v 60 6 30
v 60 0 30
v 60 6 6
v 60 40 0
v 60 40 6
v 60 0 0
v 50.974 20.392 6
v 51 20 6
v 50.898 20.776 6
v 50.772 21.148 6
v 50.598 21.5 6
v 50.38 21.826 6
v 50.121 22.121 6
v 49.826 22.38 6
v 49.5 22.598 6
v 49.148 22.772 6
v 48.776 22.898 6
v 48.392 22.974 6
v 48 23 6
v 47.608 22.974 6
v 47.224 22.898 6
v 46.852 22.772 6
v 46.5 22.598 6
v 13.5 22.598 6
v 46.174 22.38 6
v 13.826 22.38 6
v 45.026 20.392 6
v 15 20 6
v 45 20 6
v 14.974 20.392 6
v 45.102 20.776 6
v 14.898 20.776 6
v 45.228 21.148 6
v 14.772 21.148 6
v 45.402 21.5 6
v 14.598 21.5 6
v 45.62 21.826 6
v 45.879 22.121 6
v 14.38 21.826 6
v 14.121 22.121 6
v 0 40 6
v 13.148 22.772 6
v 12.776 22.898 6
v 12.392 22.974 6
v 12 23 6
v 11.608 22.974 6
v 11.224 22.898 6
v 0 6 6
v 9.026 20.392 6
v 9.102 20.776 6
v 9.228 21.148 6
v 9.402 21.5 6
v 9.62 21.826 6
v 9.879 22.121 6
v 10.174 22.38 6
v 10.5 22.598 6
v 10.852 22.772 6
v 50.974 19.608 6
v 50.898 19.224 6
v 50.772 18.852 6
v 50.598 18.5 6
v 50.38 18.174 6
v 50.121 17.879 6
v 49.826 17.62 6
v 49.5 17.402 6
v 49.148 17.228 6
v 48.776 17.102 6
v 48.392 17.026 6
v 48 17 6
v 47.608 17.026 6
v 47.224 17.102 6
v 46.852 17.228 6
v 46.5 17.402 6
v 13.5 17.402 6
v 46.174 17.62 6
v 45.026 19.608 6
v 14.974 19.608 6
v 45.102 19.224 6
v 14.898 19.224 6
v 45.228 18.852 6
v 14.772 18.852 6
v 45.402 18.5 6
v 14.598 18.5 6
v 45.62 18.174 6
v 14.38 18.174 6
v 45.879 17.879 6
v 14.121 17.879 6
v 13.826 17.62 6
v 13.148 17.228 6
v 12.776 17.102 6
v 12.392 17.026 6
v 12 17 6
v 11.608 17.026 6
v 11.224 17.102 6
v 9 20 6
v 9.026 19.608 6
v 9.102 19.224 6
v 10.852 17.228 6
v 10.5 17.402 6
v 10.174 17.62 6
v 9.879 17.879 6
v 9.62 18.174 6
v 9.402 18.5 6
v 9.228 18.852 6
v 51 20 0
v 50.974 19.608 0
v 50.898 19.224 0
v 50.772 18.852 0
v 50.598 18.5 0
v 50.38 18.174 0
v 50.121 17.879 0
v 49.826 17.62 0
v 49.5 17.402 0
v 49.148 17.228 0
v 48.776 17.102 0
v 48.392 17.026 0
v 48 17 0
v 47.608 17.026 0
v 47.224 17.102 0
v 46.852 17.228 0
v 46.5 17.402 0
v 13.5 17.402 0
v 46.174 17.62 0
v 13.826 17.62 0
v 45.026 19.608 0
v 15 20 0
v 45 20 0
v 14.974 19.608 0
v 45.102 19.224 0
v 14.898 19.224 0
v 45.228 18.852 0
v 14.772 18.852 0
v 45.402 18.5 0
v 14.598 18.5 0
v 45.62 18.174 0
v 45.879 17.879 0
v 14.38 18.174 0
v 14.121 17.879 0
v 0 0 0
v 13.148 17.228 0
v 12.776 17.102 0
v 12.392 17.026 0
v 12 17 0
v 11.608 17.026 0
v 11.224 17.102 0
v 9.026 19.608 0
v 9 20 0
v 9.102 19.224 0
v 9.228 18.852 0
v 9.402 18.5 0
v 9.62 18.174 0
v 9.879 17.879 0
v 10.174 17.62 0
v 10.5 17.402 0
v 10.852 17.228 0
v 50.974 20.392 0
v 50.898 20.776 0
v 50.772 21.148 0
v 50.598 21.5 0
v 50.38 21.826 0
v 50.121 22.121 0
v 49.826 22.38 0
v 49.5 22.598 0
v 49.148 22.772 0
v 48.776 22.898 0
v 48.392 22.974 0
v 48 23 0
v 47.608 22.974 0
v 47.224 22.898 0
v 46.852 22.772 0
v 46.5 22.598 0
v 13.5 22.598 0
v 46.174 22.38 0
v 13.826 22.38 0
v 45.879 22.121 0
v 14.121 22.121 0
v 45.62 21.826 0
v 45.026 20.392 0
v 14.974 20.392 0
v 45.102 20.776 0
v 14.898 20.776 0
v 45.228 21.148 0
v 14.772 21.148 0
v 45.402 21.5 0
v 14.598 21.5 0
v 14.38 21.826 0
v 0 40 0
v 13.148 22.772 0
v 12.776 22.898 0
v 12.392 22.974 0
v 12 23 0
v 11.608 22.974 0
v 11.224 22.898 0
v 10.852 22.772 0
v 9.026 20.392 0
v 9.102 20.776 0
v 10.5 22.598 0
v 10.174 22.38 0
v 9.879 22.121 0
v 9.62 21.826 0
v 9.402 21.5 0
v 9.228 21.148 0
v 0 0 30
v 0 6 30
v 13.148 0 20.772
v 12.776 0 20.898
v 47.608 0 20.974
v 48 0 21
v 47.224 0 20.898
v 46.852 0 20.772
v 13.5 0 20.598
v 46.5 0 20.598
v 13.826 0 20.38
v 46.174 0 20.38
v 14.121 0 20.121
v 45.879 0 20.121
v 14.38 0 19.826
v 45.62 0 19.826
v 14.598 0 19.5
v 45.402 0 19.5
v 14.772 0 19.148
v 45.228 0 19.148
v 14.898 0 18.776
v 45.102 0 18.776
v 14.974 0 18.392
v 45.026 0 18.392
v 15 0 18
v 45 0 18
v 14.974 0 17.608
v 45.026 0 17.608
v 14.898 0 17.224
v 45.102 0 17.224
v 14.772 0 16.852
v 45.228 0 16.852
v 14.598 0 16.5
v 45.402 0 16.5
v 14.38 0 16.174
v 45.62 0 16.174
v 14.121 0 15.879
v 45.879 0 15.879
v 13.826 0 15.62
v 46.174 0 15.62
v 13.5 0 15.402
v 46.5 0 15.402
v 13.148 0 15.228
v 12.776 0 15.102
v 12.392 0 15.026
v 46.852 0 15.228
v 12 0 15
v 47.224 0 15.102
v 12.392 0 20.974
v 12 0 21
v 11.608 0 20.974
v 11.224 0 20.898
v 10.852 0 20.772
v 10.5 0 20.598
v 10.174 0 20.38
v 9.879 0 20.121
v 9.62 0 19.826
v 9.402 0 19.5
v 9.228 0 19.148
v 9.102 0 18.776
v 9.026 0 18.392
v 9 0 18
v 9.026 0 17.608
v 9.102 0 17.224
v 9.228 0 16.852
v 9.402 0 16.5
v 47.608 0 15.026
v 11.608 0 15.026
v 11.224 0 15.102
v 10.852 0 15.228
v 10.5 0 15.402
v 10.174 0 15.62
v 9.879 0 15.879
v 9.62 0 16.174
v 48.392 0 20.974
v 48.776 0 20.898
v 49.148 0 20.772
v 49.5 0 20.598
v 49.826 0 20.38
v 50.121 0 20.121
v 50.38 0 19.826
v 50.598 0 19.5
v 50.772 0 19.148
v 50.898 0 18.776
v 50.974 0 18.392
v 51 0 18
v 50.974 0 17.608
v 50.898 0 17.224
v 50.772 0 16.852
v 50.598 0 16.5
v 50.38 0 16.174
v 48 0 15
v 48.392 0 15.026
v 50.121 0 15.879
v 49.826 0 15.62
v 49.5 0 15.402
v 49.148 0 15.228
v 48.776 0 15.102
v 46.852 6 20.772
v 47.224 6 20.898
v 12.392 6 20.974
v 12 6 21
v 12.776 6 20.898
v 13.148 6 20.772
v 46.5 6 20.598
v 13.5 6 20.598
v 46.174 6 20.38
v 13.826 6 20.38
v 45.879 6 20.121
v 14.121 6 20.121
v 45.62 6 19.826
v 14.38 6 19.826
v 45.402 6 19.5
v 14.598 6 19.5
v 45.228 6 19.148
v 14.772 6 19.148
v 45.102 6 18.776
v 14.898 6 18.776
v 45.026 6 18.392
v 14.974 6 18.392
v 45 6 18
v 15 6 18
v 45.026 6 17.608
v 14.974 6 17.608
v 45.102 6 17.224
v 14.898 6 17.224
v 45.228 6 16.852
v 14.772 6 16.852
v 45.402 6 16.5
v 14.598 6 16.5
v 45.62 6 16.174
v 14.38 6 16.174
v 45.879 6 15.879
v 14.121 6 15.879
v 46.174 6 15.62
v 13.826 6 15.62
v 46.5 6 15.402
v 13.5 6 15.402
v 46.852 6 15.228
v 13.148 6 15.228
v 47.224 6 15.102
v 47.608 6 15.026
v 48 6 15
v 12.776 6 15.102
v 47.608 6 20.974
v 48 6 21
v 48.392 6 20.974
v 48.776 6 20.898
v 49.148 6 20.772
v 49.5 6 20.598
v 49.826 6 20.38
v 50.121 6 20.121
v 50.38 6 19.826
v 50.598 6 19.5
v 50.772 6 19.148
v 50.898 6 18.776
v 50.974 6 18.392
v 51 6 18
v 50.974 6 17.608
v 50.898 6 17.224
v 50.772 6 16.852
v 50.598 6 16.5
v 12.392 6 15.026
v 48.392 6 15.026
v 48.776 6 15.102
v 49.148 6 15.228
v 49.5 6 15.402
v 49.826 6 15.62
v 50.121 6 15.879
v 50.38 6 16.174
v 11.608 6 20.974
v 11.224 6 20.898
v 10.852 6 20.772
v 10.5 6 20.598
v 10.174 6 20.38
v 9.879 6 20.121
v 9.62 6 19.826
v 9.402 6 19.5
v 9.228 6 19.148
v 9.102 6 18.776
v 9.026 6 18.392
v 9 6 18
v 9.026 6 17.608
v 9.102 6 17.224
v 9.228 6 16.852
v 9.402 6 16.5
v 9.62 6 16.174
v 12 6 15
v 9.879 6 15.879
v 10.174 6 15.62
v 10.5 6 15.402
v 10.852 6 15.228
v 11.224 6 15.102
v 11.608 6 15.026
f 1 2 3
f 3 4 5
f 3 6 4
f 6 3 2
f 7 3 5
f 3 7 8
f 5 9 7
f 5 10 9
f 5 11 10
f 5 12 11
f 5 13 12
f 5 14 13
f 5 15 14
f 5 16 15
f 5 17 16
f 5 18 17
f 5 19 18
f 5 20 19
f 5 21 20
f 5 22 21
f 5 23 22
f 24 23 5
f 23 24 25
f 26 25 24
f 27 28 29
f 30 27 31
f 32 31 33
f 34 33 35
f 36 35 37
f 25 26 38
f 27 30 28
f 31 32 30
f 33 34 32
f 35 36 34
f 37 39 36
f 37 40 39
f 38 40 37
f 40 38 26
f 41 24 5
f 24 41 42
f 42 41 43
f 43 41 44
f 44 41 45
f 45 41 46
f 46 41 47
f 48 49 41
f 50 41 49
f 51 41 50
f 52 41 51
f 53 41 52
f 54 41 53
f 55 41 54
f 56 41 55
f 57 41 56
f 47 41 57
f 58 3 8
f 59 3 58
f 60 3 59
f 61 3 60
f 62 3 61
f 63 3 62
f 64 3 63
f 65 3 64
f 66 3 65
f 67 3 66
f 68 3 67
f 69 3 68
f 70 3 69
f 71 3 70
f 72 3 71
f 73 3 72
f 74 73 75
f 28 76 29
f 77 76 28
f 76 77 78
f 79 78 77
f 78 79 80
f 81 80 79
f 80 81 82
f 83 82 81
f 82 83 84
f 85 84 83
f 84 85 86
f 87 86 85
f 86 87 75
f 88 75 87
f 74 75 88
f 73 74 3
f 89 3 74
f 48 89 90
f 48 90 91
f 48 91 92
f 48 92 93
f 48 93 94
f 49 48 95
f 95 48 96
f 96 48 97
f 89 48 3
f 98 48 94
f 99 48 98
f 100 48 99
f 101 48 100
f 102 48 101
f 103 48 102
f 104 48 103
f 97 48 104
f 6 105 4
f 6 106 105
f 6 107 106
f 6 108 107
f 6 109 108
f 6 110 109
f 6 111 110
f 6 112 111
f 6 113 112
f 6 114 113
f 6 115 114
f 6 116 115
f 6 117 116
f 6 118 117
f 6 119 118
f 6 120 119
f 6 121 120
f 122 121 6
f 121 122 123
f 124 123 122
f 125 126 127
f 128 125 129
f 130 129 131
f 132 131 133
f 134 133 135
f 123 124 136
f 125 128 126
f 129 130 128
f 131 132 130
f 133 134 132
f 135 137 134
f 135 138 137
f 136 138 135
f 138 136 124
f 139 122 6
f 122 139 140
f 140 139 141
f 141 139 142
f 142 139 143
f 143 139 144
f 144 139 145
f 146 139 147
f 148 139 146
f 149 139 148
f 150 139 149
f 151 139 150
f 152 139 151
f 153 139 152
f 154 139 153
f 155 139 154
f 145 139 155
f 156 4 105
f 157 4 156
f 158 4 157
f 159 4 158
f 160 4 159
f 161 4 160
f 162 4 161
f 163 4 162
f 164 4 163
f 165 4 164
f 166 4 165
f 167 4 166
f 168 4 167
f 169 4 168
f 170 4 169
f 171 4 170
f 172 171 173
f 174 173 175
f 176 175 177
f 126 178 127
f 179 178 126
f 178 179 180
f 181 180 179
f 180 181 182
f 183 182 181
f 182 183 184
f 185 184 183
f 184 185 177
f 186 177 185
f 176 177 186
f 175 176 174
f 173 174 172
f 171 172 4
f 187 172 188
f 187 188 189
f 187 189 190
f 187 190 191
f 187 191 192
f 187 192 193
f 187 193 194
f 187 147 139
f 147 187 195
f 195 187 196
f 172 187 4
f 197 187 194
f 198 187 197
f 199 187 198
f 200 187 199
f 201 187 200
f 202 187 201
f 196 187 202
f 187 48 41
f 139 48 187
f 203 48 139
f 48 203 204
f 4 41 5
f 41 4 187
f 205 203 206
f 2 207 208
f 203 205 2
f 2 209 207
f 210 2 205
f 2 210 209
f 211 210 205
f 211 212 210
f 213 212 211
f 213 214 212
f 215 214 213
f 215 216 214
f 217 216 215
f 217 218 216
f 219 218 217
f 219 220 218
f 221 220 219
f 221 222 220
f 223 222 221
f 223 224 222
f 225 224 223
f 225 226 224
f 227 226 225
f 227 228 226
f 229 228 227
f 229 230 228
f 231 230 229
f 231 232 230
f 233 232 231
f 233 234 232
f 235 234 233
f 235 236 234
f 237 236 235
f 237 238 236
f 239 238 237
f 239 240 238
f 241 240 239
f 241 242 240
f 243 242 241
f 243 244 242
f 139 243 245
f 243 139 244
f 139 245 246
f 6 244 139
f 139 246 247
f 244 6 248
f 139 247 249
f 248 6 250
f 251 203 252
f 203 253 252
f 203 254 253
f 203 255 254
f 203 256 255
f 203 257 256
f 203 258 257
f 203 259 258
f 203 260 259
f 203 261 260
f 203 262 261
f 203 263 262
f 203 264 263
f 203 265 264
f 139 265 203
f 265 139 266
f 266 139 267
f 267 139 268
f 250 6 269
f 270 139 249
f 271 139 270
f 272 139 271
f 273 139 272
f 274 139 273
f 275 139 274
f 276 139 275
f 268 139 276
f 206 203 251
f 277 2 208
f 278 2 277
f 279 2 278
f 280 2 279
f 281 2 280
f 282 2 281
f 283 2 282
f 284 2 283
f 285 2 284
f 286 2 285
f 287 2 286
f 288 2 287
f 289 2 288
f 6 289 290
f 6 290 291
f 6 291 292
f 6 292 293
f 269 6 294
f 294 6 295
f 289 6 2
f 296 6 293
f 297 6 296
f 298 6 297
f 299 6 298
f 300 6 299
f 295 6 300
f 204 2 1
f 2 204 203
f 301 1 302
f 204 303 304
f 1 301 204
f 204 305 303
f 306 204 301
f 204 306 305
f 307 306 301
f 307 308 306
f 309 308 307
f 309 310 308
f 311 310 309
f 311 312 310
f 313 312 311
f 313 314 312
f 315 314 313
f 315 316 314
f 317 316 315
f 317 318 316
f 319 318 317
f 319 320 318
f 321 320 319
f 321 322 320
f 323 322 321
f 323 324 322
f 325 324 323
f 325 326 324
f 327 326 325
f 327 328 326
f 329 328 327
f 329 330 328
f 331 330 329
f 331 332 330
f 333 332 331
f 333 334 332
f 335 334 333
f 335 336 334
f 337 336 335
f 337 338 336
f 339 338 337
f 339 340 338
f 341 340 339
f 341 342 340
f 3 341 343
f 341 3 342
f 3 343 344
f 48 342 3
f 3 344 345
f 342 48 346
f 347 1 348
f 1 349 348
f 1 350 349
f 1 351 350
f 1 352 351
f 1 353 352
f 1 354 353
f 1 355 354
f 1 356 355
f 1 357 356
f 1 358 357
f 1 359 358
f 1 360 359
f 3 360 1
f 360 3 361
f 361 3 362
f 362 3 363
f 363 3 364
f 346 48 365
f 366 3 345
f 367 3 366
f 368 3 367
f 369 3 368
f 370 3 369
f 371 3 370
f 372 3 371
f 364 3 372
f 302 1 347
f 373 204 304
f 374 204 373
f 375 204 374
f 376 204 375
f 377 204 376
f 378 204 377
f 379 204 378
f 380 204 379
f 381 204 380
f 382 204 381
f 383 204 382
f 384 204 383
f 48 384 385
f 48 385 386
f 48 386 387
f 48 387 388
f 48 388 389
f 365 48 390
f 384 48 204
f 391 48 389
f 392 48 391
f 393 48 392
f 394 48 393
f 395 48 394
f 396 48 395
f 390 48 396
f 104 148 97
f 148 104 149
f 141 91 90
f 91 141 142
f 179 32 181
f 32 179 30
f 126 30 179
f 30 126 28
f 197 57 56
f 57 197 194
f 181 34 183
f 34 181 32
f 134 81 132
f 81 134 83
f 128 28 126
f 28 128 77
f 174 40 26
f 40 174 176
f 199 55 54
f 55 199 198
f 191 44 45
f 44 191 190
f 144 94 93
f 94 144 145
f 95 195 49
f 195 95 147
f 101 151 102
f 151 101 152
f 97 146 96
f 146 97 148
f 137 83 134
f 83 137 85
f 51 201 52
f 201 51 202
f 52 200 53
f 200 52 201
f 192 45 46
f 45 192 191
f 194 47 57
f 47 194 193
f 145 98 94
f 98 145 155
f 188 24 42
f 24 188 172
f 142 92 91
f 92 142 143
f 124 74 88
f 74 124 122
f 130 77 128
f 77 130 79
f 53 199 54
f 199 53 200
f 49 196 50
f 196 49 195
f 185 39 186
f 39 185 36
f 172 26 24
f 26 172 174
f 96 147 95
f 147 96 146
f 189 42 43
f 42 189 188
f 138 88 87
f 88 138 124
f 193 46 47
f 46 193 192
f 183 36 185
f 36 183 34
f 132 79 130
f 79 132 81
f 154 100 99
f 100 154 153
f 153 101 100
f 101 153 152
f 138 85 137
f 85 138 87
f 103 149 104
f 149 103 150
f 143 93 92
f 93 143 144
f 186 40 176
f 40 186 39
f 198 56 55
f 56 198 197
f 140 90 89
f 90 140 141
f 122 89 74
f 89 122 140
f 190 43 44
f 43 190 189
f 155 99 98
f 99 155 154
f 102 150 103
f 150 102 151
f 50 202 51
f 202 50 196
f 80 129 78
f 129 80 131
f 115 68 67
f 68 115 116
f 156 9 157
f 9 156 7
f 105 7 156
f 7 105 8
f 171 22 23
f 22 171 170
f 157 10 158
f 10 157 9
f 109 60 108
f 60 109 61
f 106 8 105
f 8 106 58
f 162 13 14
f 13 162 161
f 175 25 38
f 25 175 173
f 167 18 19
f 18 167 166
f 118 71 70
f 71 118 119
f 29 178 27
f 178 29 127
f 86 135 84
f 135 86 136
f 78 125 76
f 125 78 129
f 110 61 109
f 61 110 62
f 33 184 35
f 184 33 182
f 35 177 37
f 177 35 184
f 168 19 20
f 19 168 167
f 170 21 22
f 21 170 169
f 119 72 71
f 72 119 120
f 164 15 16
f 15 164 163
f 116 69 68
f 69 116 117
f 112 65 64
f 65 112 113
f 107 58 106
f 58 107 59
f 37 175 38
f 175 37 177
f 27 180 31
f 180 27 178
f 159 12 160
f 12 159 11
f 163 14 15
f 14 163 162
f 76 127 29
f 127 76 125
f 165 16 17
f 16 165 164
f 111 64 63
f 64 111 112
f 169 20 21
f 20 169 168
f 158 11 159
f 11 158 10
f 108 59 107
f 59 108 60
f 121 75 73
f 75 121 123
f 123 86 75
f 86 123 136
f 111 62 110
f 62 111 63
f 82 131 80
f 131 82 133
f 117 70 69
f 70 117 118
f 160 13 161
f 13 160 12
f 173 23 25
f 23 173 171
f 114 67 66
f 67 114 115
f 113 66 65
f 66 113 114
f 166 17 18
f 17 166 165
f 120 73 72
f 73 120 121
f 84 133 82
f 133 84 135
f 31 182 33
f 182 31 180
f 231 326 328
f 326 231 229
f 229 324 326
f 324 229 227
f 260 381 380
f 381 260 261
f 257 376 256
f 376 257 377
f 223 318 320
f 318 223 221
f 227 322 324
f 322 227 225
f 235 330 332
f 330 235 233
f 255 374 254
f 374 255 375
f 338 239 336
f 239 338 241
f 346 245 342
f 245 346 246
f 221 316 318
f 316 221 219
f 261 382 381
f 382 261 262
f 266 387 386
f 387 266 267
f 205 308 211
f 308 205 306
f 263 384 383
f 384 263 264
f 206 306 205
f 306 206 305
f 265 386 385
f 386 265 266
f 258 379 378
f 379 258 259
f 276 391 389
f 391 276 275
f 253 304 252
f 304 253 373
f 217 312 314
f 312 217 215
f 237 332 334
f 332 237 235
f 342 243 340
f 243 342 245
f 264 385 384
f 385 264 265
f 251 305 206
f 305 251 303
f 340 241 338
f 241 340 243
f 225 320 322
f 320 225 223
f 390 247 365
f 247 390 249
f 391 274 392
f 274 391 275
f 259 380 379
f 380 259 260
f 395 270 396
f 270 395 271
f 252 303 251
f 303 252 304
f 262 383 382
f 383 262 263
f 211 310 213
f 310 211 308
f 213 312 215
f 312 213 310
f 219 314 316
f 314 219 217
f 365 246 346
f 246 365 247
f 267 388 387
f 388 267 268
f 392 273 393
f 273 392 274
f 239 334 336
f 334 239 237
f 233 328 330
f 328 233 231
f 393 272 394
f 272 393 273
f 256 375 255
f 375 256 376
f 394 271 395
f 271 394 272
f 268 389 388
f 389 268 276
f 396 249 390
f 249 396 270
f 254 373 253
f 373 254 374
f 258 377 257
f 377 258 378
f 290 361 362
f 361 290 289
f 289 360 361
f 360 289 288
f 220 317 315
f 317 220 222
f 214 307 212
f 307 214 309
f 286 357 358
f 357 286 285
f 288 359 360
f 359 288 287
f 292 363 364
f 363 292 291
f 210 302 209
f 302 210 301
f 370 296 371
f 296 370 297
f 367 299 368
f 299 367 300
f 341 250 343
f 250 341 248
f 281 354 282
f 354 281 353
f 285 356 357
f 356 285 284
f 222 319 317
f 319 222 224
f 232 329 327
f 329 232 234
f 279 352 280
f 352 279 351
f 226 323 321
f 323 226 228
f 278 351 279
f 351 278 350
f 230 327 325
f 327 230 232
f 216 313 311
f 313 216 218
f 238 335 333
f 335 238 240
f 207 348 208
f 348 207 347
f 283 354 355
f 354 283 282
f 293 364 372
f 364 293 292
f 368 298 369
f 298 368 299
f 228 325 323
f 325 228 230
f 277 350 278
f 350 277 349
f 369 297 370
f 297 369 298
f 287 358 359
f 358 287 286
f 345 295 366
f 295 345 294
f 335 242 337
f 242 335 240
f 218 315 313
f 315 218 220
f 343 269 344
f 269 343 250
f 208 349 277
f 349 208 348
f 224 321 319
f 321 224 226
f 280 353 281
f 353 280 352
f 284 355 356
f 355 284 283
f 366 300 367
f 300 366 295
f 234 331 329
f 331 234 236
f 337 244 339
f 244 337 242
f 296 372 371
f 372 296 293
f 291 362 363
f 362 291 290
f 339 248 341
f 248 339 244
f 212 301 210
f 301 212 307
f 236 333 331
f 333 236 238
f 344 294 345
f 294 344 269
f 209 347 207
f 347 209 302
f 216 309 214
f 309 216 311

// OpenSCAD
// Synthetic, dimensioned OpenSCAD source for CAD/CAM handoff fixtures.
// Units: millimetres. Revision: A.

plate_width = 60;
plate_depth = 40;
plate_thickness = 6;
back_height = 30;
hole_diameter = 6;
hole_offset = 12;

difference() {
    union() {
        cube([plate_width, plate_depth, plate_thickness]);
        cube([plate_width, plate_thickness, back_height]);
    }

    translate([hole_offset, plate_depth / 2, -1])
        cylinder(h = plate_thickness + 2, d = hole_diameter, $fn = 48);
    translate([plate_width - hole_offset, plate_depth / 2, -1])
        cylinder(h = plate_thickness + 2, d = hole_diameter, $fn = 48);
    translate([hole_offset, -1, back_height - hole_offset])
        rotate([-90, 0, 0])
            cylinder(h = plate_thickness + 2, d = hole_diameter, $fn = 48);
    translate([plate_width - hole_offset, -1, back_height - hole_offset])
        rotate([-90, 0, 0])
            cylinder(h = plate_thickness + 2, d = hole_diameter, $fn = 48);
}
